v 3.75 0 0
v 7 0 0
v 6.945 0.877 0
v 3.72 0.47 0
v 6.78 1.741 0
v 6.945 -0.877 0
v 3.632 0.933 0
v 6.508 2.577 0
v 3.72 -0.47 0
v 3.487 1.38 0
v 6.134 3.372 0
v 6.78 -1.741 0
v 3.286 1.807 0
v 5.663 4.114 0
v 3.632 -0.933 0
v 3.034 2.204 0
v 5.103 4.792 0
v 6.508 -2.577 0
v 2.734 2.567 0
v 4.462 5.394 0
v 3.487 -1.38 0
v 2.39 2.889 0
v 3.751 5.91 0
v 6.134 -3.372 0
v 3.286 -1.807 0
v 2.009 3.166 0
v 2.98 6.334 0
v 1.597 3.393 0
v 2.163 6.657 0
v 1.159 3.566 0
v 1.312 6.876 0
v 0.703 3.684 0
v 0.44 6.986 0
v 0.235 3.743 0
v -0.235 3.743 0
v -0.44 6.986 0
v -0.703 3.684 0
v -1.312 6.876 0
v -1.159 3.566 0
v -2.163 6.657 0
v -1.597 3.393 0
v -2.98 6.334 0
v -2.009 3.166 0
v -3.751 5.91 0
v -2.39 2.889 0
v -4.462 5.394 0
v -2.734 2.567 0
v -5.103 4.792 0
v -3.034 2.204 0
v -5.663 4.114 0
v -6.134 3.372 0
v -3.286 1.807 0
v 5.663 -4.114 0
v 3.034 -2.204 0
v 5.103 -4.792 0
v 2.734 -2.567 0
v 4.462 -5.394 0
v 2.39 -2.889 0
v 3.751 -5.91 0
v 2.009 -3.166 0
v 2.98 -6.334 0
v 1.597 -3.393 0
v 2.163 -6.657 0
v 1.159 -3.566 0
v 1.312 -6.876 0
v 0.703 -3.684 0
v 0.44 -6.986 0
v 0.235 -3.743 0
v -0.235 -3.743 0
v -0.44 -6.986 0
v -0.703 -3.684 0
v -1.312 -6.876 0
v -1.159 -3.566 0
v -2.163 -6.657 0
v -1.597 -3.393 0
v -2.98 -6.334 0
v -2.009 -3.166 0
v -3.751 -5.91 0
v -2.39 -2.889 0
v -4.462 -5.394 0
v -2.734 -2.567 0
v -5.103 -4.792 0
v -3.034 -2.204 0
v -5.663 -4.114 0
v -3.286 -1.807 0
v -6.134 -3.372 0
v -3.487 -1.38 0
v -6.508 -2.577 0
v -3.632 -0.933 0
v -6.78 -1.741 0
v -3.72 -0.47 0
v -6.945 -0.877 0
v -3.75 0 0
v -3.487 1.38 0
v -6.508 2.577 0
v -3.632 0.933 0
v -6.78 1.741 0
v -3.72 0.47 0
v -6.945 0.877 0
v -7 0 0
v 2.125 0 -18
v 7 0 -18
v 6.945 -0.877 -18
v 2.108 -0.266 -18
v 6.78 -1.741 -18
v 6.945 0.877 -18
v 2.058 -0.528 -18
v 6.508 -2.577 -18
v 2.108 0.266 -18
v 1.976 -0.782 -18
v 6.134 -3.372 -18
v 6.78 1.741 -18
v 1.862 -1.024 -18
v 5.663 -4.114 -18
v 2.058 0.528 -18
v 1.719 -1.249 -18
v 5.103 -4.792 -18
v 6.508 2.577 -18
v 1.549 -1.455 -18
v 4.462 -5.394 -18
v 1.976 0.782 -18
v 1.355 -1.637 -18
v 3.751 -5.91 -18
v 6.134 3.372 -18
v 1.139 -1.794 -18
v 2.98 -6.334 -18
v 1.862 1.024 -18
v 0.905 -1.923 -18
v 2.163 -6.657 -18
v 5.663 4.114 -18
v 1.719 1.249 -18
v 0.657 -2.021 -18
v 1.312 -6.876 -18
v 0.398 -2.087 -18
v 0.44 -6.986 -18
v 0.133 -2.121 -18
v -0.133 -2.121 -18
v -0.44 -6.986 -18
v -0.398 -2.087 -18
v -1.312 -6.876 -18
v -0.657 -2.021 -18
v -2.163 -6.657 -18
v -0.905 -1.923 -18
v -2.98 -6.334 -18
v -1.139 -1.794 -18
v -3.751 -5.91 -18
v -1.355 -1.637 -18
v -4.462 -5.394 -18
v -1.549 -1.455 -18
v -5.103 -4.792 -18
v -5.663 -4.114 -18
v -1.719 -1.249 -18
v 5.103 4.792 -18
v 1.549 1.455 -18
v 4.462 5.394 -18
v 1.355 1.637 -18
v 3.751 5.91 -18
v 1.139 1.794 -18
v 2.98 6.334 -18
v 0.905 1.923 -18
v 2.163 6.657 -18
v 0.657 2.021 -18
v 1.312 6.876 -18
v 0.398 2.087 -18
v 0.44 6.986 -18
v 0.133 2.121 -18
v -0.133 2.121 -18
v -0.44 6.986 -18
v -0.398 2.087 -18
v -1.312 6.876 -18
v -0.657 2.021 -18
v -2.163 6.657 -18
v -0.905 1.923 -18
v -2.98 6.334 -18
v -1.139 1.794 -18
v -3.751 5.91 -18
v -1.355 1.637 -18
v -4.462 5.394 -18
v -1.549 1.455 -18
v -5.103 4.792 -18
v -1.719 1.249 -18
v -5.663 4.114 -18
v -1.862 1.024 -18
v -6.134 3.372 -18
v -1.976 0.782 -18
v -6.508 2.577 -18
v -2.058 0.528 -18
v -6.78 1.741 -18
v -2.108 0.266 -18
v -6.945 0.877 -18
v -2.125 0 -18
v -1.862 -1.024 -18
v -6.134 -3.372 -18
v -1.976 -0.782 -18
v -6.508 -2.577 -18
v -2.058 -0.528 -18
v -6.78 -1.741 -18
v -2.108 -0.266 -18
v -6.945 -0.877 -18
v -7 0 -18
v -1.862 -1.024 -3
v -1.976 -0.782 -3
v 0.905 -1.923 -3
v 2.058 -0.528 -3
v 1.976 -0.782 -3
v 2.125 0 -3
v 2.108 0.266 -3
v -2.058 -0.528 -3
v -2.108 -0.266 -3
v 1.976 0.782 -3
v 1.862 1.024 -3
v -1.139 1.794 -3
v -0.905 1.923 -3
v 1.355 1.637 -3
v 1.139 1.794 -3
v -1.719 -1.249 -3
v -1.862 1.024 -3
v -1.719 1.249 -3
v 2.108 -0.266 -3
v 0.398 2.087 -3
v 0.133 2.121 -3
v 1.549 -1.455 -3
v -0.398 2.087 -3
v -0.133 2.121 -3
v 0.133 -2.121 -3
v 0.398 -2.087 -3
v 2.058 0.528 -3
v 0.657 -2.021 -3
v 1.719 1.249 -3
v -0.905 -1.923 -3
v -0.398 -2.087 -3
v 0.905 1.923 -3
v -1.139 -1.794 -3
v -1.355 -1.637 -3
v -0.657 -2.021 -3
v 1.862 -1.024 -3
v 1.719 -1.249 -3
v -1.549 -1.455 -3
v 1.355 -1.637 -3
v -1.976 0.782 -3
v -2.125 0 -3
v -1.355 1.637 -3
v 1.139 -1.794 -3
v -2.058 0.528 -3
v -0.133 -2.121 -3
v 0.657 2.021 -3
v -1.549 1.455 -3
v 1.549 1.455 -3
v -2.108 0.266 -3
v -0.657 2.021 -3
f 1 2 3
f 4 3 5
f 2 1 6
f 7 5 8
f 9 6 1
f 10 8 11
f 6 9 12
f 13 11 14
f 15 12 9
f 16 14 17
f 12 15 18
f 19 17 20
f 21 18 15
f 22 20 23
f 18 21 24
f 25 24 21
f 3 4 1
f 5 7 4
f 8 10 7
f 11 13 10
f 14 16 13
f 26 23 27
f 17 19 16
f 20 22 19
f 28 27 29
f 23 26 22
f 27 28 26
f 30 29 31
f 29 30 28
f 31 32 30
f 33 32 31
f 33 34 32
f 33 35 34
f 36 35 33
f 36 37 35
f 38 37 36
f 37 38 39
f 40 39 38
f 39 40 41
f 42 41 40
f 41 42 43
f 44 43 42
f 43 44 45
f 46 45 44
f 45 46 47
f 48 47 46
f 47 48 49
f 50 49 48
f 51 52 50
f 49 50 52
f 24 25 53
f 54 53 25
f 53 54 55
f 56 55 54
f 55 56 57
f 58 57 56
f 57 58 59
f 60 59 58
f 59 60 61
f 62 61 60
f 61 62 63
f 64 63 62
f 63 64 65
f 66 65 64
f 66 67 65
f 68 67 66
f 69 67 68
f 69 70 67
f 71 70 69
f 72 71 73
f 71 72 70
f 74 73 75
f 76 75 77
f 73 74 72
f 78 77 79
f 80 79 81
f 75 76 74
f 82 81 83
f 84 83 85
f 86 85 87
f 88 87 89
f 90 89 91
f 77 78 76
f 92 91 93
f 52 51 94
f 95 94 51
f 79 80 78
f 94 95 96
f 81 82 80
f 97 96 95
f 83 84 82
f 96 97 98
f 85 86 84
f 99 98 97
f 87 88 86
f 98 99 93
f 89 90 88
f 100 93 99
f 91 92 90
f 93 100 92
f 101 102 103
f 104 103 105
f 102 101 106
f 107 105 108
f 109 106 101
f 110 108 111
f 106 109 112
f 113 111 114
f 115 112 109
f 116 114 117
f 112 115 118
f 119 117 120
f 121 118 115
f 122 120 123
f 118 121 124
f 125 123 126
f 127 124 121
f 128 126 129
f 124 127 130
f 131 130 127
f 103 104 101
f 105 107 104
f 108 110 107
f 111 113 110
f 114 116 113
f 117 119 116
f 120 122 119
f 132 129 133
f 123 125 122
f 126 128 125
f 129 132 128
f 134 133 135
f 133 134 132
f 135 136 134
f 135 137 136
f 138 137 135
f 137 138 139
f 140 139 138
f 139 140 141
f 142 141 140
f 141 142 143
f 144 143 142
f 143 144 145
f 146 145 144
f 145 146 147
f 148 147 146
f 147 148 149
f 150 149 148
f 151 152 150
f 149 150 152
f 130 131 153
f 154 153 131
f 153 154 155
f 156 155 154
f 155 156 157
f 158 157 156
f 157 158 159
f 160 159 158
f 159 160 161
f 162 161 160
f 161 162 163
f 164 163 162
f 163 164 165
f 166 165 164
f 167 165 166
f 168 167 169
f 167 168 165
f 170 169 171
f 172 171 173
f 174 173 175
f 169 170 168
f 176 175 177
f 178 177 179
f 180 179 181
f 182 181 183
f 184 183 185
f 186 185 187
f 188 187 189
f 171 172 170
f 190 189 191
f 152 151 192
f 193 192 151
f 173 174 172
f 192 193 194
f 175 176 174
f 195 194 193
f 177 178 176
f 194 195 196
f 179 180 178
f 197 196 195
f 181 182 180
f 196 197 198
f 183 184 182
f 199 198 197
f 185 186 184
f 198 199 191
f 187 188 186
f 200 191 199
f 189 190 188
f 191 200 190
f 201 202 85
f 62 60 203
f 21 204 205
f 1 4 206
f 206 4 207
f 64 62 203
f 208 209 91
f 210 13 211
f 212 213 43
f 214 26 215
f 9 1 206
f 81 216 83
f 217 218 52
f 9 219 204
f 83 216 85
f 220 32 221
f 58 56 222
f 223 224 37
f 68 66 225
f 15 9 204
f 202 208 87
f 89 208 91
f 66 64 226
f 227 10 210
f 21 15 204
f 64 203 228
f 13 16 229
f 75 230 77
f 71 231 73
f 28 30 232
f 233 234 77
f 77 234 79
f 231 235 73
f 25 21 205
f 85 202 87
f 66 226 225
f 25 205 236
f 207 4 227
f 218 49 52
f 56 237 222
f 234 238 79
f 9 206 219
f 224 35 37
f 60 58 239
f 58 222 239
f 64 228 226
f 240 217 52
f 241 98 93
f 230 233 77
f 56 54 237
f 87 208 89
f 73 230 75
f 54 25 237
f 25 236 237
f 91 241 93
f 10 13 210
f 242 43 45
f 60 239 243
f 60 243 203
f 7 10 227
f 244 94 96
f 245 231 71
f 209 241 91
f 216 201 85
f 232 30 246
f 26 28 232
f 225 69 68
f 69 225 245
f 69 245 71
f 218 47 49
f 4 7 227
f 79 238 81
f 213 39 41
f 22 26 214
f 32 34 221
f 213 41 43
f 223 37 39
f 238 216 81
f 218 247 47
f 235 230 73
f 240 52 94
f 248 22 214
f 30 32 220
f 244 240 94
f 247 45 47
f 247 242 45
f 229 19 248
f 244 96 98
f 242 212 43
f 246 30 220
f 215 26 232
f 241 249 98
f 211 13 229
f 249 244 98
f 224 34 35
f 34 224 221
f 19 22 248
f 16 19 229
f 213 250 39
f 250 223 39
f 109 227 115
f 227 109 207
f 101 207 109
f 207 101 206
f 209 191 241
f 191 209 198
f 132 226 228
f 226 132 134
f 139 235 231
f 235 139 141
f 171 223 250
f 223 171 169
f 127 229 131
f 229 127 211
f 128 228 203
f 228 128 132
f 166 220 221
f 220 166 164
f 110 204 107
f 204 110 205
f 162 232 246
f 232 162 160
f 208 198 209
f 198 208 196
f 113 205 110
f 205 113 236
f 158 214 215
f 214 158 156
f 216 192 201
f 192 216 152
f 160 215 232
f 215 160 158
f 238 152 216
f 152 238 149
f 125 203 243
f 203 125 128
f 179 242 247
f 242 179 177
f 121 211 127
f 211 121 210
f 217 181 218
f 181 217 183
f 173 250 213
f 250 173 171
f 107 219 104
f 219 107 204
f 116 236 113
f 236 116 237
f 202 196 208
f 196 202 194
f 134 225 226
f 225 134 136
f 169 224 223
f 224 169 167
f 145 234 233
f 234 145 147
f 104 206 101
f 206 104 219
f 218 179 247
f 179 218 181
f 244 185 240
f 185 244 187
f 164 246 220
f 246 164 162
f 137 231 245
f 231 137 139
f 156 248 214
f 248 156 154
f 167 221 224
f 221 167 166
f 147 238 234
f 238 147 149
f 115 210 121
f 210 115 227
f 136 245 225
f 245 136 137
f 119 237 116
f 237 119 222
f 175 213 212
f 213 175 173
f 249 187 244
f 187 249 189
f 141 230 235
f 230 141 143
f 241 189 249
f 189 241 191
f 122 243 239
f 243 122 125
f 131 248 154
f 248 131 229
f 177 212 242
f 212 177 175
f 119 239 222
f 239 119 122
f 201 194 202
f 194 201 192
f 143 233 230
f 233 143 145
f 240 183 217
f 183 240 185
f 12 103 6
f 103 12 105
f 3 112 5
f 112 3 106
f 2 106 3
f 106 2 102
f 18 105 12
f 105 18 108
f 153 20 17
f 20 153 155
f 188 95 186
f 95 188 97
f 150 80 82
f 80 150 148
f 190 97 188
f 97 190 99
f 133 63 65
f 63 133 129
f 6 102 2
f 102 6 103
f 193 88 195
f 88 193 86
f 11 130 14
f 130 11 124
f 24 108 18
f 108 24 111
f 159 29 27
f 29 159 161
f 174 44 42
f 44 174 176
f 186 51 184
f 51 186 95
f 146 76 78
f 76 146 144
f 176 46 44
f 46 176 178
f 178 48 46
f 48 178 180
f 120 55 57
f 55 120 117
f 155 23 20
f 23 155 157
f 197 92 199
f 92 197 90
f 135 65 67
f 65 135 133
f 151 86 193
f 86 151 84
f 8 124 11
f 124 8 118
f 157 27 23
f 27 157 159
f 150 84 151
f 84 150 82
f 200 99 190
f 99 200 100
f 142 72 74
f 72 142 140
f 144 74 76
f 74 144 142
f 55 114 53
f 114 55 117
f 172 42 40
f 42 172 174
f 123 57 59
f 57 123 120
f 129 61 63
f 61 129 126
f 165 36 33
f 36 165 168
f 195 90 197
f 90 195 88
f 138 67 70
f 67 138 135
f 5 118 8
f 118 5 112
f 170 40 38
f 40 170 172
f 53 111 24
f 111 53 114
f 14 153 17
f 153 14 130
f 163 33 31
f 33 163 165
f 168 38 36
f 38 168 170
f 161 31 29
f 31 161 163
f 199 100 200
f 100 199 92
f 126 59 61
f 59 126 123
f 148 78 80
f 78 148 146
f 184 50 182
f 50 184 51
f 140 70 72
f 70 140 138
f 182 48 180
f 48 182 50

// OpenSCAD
$fn = 50;


difference() {
	union() {
		translate(v = [0, 0, -18.0000000000]) {
			cylinder(h = 18, r = 7.0000000000);
		}
		cylinder(h = 0, r = 16.0000000000);
	}
	union() {
		translate(v = [0, 0, 0]) {
			rotate(a = [0, 0, 0]) {
				difference() {
					union() {
						#translate(v = [0, 0, -18.0000000000]) {
							cylinder(h = 18, r = 2.0000000000);
						}
						#translate(v = [0, 0, -3]) {
							cylinder(h = 3, r1 = 2.1250000000, r2 = 3.7500000000);
						}
						#translate(v = [0, 0, -18.0000000000]) {
							cylinder(h = 18, r = 2.1250000000);
						}
						#translate(v = [0, 0, -18.0000000000]) {
							cylinder(h = 18, r = 2.0000000000);
						}
					}
					union();
				}
			}
		}
	}
}
